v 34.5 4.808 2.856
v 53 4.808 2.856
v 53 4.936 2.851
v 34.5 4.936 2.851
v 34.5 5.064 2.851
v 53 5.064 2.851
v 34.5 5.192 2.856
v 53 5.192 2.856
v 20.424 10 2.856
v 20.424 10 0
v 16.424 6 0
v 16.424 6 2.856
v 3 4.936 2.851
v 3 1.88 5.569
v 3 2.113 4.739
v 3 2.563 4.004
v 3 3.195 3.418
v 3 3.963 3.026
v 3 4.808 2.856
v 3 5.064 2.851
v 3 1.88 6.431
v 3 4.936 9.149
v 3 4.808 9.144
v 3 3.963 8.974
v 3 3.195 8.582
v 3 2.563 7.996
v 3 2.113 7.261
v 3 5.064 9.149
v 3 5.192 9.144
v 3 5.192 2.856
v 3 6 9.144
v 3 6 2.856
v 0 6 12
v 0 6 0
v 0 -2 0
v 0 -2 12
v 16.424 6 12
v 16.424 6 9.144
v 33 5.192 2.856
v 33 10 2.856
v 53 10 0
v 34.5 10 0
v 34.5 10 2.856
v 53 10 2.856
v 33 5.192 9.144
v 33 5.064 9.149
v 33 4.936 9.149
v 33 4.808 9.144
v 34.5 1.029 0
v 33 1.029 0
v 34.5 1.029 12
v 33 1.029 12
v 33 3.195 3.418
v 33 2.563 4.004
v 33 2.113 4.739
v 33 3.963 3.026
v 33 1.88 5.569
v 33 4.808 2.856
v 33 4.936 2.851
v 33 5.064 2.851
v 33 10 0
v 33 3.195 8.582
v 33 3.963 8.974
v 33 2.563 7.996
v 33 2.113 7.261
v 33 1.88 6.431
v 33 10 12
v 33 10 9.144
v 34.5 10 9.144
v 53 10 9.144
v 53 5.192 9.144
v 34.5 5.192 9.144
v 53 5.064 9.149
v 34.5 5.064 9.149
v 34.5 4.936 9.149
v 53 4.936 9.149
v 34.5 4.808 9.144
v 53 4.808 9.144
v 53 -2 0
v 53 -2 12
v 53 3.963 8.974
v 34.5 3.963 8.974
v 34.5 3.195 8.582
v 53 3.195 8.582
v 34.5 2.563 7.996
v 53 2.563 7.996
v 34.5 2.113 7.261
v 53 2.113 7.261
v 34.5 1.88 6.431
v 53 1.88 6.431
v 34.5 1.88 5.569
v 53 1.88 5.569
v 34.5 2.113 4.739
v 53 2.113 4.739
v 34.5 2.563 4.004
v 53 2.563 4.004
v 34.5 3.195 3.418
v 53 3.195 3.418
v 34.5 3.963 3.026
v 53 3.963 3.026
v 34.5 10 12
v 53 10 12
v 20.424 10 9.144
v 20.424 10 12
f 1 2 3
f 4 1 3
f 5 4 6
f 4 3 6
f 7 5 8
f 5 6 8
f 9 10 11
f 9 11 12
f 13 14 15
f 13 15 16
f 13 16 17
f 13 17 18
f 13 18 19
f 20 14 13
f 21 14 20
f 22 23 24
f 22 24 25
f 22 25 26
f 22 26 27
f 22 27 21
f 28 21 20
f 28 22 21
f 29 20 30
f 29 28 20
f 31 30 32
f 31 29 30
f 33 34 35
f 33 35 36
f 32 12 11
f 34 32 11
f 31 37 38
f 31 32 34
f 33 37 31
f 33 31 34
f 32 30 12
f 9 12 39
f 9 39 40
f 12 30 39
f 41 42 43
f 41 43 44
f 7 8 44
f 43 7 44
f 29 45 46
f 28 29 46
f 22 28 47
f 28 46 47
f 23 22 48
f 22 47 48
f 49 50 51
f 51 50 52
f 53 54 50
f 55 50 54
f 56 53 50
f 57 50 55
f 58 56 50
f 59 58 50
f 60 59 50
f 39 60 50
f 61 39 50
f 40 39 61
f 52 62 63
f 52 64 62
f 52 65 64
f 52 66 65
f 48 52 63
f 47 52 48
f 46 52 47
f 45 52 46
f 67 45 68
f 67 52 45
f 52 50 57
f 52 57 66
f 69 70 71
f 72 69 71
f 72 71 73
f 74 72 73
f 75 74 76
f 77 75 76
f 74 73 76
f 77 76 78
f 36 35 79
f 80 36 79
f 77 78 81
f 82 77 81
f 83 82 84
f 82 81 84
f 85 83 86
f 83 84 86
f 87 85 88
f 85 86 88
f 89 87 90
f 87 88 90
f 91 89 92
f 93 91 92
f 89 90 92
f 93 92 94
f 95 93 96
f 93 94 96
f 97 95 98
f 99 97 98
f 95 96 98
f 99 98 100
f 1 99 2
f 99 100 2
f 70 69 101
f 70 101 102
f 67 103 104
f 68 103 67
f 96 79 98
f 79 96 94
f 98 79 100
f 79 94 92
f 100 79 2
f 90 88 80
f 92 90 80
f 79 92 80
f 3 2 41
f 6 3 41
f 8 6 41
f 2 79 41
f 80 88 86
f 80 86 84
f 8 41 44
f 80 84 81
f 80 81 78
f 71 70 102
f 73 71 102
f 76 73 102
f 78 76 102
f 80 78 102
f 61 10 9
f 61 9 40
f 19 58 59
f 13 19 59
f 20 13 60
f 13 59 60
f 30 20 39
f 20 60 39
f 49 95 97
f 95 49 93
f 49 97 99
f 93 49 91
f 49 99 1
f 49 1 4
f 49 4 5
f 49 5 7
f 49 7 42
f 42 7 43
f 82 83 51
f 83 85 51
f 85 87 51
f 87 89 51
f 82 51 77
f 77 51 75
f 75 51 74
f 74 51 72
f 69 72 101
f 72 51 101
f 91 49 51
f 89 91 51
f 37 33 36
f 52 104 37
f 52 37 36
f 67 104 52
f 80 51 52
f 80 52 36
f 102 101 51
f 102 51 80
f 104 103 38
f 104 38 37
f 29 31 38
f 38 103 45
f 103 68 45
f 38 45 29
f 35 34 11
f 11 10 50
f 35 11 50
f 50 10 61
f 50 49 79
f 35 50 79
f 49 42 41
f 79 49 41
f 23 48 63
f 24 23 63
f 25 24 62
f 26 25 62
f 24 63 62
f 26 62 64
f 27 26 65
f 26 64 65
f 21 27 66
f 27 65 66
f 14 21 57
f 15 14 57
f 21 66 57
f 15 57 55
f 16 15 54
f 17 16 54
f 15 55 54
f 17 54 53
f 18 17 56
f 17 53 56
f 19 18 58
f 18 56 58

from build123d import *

# Parameters (mm, degrees)
F0_W      = 93
F0_H      = 10
F1_DEPTH  = 12
F3_DEPTH  = 90
F5_W      = 8.9714768017
F5_H      = 12
F6_DEPTH  = 1.5
F7_DEPTH  = 2
F8_DEPTH  = 40
F9_W      = 20.4241964966
F9_H      = 12
F10_DEPTH = 4
F11_SIZE  = 3.99999


# Not quite as in the source:
# - a fillet or chamfer is up to 0.001 mm smaller than in the source, because OpenCascade refuses the exact size


with BuildPart() as f1:
    # F0 (on Top) → F1 (new body)
    with BuildSketch(Plane.XY):
        with Locations((46.5, 5)):
            Rectangle(F0_W, F0_H)
    extrude(amount=F1_DEPTH)

    # F2 (on face) → F3 (cut)
    with BuildSketch(Plane.YZ.offset(93)):
        with BuildLine():
            Line((4.8075824627, 6), (4.8075824627, 9.1441176014))
            ThreePointArc((4.8075824627, 9.1441176014), (1.85, 6), (4.8075824627, 2.8558823986))
            Line((4.8075824627, 2.8558823986), (4.8075824627, 6))
        make_face()
        with BuildLine():
            ThreePointArc((5.1924175373, 9.1441176014), (5, 9.15), (4.8075824627, 9.1441176014))
            Line((4.8075824627, 9.1441176014), (5.1924175373, 9.1441176014))
        make_face()
        with BuildLine():
            Line((5.1924175373, 9.1441176014), (4.8075824627, 9.1441176014))
            Line((4.8075824627, 9.1441176014), (4.8075824627, 6))
            Line((4.8075824627, 6), (8.15, 6))
            ThreePointArc((8.15, 6), (7.2944079021, 8.1582845917), (5.1924175373, 9.1441176014))
        make_face()
        with BuildLine():
            Line((5.1924175373, 2.8558823986), (4.8075824627, 2.8558823986))
            ThreePointArc((4.8075824627, 2.8558823986), (5, 2.85), (5.1924175373, 2.8558823986))
        make_face()
        with BuildLine():
            Line((4.8075824627, 6), (4.8075824627, 2.8558823986))
            Line((4.8075824627, 2.8558823986), (5.1924175373, 2.8558823986))
            ThreePointArc((5.1924175373, 2.8558823986), (7.2944079021, 3.8417154083), (8.15, 6))
            Line((8.15, 6), (4.8075824627, 6))
        make_face()
        with BuildLine():
            Line((10, 9.1441176014), (5.1924175373, 9.1441176014))
            ThreePointArc((5.1924175373, 9.1441176014), (7.2944079021, 8.1582845917), (8.15, 6))
            Line((8.15, 6), (10, 6))
            Line((10, 6), (10, 9.1441176014))
        make_face()
        with BuildLine():
            ThreePointArc((8.15, 6), (7.2944079021, 3.8417154083), (5.1924175373, 2.8558823986))
            Line((5.1924175373, 2.8558823986), (10, 2.8558823986))
            Line((10, 2.8558823986), (10, 6))
            Line((10, 6), (8.15, 6))
        make_face()
    extrude(amount=-F3_DEPTH, mode=Mode.SUBTRACT)

    # F5 (on offset) → F6 (cut)
    with BuildSketch(Plane.YZ.offset(33)):
        with Locations((5.5142615992, 6)):
            Rectangle(F5_W, F5_H)
    extrude(amount=F6_DEPTH, mode=Mode.SUBTRACT)

    # F7 (add): a face of the model
    f7_faces = [f1.faces().sort_by_distance(p)[0] for p in [
        (46.5, 0, 6),
    ]]
    extrude(f7_faces, amount=F7_DEPTH)

    # F8 (cut): a face of the model
    f8_faces = [f1.faces().sort_by_distance(p)[0] for p in [
        (93, 4, 0.1697056275),
    ]]
    extrude(f8_faces, amount=-F8_DEPTH, mode=Mode.SUBTRACT)

    # F9 (on face) → F10 (cut)
    with BuildSketch(Plane(origin=(0, 10, 0), x_dir=(-1, 0, 0), z_dir=(0, 1, 0))):
        with Locations((-10.2120982483, 6)):
            Rectangle(F9_W, F9_H)
    extrude(amount=-F10_DEPTH, mode=Mode.SUBTRACT)

    # F11 (size 4 in the source; OpenCascade refuses exactly that, so slightly less here)
    f11_edges = [f1.edges().sort_by_distance(p)[0] for p in [
        (20.424196, 6, 1.427941),
        (20.424196, 6, 10.572059),
    ]]
    chamfer(f11_edges, length=F11_SIZE)


solid = f1.part
